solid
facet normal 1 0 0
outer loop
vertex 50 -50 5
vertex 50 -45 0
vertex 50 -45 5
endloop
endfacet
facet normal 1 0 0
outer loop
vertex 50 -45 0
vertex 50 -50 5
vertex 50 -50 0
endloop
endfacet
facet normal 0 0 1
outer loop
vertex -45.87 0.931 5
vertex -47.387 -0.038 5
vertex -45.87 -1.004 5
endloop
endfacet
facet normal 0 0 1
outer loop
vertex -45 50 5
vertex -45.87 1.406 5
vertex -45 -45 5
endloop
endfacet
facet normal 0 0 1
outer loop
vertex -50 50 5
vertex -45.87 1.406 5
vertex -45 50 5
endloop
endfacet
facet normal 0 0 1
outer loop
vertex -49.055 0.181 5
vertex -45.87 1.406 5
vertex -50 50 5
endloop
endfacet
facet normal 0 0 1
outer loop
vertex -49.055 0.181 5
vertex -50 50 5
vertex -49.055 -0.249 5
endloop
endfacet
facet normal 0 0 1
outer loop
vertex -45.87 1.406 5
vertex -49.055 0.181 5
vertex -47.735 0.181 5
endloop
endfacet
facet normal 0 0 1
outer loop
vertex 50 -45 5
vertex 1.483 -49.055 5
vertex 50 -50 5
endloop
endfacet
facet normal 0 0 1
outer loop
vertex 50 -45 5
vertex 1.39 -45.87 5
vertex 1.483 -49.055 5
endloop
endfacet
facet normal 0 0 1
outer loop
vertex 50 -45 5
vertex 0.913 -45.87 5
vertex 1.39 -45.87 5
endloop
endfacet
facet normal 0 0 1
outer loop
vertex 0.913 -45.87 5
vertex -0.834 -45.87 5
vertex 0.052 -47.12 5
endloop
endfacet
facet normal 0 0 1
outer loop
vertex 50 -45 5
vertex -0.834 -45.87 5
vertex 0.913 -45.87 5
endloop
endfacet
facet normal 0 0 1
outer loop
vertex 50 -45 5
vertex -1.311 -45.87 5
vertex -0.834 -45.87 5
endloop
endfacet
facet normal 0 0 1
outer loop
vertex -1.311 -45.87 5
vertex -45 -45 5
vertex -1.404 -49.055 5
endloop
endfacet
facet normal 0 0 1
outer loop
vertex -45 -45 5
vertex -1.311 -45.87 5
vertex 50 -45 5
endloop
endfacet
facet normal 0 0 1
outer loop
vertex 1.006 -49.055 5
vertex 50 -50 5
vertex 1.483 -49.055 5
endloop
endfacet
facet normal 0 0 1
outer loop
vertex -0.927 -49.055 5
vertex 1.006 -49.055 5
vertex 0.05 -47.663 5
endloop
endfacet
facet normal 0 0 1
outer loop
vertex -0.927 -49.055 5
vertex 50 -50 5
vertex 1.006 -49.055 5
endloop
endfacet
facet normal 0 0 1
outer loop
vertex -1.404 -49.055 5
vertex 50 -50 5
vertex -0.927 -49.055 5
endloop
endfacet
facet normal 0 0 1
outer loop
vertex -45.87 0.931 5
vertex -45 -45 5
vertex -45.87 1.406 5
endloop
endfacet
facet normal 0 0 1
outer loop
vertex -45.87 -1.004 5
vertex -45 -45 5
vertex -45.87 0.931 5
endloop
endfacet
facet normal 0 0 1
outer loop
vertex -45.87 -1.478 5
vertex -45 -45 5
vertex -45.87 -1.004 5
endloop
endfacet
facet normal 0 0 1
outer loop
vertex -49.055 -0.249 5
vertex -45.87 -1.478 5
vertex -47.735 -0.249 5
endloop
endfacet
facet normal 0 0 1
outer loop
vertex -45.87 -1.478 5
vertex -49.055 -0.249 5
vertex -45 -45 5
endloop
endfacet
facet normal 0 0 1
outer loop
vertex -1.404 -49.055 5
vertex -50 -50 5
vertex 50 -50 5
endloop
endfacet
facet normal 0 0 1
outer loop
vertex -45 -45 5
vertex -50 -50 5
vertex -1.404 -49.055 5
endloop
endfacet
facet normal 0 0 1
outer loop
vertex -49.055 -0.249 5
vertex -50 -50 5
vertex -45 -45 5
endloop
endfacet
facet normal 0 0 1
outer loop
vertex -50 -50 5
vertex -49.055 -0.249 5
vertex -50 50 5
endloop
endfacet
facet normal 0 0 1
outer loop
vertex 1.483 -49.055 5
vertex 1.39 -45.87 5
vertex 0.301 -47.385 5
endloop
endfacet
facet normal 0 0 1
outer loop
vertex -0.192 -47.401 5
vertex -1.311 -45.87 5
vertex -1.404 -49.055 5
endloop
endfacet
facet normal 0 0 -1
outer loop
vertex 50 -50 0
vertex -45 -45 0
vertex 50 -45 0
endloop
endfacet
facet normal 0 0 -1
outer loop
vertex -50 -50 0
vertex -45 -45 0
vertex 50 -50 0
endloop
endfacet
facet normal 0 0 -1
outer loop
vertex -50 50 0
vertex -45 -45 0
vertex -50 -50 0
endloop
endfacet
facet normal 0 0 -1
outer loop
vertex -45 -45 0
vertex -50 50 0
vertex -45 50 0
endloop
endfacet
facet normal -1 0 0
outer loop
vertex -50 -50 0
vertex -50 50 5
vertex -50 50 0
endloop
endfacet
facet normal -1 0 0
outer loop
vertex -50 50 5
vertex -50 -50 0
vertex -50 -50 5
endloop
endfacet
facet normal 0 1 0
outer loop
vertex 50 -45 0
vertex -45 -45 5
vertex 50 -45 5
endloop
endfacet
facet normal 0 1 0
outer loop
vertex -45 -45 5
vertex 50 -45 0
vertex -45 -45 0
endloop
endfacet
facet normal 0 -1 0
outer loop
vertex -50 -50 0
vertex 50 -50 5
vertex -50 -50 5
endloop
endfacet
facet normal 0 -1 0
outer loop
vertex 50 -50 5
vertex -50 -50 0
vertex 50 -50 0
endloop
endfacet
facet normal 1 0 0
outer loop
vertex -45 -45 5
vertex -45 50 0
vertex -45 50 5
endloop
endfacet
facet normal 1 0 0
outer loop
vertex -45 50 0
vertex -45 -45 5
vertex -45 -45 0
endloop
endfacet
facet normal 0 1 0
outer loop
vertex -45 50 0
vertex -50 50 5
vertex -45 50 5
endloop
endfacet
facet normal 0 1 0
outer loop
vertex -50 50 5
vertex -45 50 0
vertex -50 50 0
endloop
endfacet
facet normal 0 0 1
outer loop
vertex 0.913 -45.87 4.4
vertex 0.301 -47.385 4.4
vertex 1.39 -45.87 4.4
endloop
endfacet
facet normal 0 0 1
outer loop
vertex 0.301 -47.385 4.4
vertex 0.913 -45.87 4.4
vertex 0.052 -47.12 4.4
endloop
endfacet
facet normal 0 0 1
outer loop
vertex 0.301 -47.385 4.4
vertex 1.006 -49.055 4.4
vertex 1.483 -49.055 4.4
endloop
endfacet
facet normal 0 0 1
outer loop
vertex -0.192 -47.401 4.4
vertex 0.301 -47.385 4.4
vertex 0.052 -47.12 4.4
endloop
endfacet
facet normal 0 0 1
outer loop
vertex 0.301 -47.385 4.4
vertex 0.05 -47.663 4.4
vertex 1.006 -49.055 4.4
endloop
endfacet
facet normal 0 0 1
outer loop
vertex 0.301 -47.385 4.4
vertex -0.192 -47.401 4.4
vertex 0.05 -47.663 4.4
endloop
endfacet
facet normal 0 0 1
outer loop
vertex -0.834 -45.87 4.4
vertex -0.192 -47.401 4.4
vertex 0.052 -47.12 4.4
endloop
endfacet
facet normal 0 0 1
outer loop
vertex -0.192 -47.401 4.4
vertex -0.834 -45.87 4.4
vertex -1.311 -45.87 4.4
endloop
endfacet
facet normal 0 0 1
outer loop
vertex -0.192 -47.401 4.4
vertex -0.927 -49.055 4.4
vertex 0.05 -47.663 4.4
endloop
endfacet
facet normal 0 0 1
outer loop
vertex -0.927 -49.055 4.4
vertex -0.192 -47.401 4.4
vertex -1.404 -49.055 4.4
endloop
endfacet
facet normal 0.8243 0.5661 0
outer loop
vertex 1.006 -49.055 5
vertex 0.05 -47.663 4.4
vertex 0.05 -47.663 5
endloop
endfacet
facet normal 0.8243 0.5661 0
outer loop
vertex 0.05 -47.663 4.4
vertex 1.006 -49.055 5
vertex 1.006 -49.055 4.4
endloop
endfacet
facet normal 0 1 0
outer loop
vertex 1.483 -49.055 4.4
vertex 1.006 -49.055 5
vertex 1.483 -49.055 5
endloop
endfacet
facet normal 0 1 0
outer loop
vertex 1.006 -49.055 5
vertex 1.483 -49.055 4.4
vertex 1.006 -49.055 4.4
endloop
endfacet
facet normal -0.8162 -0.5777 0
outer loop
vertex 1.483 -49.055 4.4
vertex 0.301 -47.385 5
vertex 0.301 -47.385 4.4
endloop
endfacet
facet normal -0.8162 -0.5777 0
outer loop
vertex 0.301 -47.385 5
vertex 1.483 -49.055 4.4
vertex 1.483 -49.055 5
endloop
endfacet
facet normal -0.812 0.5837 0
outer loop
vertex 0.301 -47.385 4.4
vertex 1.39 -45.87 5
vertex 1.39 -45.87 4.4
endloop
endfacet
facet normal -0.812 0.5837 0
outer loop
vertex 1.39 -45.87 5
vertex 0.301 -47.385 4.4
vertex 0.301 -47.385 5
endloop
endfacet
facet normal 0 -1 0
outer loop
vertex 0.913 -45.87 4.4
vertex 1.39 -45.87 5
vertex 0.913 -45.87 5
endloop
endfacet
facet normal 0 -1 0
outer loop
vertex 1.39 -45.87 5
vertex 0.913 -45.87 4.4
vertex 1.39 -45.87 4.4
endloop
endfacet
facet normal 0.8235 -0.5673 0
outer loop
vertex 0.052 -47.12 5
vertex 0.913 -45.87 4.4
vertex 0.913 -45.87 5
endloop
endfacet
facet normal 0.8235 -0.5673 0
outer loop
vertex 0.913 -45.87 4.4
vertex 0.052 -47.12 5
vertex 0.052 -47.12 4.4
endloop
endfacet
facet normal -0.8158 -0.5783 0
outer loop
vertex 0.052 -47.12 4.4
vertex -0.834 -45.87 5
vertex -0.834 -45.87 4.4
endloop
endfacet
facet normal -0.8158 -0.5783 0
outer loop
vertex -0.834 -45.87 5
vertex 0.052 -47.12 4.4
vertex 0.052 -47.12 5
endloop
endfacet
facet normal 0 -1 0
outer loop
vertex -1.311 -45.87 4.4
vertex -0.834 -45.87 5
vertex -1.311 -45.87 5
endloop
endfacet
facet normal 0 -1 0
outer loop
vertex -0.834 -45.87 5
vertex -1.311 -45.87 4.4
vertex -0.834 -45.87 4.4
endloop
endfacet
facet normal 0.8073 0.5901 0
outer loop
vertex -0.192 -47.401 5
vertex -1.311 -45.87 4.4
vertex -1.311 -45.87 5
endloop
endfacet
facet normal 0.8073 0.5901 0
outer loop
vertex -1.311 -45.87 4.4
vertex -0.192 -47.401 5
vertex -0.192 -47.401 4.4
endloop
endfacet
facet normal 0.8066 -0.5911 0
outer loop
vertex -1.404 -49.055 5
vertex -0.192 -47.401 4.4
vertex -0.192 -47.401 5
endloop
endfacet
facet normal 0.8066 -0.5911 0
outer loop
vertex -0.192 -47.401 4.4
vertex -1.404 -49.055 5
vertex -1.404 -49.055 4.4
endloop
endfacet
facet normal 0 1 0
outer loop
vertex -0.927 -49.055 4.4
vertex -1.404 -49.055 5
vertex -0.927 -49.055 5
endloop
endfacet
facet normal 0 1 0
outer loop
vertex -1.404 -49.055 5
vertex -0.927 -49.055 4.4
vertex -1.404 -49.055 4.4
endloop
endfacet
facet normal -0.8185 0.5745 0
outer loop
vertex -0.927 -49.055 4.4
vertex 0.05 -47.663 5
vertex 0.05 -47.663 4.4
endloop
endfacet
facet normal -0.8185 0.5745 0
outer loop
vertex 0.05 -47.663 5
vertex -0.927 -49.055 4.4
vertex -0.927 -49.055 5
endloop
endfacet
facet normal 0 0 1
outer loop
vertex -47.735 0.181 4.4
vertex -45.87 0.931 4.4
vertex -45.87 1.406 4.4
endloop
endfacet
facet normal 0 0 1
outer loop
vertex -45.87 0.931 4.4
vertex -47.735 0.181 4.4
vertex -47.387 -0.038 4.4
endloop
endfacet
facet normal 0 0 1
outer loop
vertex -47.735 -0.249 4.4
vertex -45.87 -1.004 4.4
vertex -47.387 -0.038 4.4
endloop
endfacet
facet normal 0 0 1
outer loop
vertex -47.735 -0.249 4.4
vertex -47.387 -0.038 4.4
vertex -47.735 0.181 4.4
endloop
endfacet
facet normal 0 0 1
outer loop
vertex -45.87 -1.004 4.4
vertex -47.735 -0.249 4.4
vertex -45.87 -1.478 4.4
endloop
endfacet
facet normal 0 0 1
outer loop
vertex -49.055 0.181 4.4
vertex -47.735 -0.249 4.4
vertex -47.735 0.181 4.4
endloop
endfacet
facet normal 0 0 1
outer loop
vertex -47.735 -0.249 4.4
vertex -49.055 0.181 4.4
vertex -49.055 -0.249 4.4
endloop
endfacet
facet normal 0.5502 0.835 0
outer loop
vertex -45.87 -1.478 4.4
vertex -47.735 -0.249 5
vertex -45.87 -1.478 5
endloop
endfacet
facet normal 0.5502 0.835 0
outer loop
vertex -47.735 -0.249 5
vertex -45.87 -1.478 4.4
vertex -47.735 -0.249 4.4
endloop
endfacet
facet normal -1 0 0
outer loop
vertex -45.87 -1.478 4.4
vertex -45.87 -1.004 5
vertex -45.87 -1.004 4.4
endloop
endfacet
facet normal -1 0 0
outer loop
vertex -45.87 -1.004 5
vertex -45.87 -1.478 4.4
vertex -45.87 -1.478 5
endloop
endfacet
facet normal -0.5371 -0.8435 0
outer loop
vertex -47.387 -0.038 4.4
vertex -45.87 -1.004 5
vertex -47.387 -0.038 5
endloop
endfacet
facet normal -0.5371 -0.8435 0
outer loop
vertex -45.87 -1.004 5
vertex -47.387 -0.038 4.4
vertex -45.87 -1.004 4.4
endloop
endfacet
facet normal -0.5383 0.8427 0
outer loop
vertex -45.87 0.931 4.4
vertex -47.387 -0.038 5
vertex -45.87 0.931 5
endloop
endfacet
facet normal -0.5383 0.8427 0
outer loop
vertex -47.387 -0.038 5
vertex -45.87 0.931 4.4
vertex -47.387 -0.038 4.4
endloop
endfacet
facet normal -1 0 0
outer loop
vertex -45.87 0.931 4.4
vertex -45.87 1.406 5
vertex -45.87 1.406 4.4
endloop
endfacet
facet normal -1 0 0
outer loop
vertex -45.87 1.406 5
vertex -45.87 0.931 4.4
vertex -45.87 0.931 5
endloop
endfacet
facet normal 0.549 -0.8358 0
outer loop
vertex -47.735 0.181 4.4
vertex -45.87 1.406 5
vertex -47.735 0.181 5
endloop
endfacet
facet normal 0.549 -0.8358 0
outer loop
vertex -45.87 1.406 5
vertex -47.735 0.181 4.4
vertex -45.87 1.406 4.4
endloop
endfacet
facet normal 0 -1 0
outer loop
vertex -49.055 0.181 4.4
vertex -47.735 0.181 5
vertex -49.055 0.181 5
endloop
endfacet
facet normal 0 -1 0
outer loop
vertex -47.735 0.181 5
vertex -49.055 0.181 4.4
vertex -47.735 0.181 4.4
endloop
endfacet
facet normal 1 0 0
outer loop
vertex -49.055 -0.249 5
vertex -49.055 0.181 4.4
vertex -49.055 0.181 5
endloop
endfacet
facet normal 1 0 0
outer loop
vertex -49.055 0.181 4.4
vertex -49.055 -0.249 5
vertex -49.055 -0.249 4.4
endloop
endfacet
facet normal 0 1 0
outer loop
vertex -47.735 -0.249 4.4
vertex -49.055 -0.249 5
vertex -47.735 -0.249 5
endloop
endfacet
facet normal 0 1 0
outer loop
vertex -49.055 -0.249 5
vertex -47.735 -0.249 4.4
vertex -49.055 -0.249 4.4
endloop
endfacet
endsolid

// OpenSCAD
sideWidth = 5;
side      = [sideWidth, sideWidth, sideWidth];
XLength   = 100;
YLength   = 100;
ZLength   = 0;
textZOffs = -0.6;
textZSize = 3;
textSize  = sideWidth/1.5;

translate([-XLength/2, -YLength/2, 0]) {
  difference() {
    union() {
      cube(side+[XLength-sideWidth, 0, 0]);
      cube(side+[0, YLength-sideWidth, 0]);
      if (ZLength > sideWidth) {
        cube(side+[0, 0, ZLength-sideWidth]);
      }
    }
    color("Red") {
      translate([XLength/2, sideWidth/2, sideWidth + textZOffs]) linear_extrude(height=textZSize) text("X", size=textSize, halign="center", valign="center");
      translate([sideWidth/2, YLength/2, sideWidth + textZOffs]) rotate([0, 0, -90]) linear_extrude(height=textZSize) text("Y", size=textSize, halign="center", valign="center");
      if (ZLength > sideWidth) {
        translate([sideWidth/2, sideWidth/2, ZLength + textZOffs]) rotate([0, 0, -45]) linear_extrude(height=textZSize) text("Z", size=textSize, halign="center", valign="center");
      }
    }
  }
}
